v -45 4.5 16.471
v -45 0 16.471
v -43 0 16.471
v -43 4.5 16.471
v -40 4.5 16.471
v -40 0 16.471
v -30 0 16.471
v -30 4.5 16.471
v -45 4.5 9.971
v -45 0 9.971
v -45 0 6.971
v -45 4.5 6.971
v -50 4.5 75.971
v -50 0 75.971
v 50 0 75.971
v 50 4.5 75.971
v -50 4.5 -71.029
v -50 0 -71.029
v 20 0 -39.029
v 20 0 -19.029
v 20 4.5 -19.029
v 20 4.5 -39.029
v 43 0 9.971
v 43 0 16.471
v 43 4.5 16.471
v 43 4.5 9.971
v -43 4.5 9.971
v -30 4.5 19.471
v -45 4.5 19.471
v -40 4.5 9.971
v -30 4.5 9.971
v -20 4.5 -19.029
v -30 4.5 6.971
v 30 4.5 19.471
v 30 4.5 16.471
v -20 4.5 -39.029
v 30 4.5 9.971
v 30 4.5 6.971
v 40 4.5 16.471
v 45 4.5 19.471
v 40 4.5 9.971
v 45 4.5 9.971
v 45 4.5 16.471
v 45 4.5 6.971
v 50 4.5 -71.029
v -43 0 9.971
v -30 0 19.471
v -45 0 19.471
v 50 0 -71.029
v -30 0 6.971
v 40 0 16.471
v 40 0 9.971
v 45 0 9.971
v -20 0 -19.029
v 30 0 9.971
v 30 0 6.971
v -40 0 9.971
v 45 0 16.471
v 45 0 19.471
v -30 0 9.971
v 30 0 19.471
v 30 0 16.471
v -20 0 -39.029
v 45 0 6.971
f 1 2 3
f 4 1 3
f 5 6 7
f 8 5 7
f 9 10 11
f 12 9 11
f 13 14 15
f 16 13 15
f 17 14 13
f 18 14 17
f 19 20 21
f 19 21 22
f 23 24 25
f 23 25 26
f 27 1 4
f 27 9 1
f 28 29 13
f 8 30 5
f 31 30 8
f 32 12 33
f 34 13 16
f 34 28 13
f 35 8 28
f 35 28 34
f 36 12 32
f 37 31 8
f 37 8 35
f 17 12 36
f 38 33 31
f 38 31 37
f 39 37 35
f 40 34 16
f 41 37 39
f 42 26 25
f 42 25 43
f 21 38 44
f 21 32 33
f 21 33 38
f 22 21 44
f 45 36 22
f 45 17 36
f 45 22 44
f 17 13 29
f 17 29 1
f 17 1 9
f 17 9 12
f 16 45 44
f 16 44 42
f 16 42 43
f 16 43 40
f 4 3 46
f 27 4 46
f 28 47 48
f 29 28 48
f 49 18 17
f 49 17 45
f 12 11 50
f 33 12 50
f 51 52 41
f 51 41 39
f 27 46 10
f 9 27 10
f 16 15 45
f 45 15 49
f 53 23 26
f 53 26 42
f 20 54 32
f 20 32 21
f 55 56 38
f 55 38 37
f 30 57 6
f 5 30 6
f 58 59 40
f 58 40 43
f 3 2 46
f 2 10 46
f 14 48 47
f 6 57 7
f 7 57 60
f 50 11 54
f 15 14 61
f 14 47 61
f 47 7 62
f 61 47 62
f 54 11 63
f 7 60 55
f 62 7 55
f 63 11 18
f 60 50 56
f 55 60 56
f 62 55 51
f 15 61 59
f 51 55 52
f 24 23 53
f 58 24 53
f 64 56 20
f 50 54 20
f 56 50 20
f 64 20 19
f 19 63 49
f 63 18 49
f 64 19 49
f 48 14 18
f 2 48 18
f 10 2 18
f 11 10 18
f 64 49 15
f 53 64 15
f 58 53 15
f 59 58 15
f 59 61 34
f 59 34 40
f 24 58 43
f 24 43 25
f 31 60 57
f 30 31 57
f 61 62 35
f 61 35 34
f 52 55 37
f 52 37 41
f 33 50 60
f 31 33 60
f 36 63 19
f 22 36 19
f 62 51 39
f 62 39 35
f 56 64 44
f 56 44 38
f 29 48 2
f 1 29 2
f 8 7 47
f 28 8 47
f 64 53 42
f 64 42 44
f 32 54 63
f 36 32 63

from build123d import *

# Parameters (mm, degrees)
SKETCH2_W           = 100
SKETCH2_H           = 147
SKETCH2_W_2         = 40
SKETCH2_H_2         = 20
BOSS_EXTRUDE1_DEPTH = 4.5


with BuildPart() as part:
    # Sketch2 → Boss-Extrude1 (new body)
    with BuildSketch(Plane(origin=(0, 0, 0), x_dir=(1, 0, 0), z_dir=(0, 1, 0))):
        with Locations((0, -2.47075608)):
            Rectangle(SKETCH2_W, SKETCH2_H)
        with Locations((0, 29.02924392)):
            Rectangle(SKETCH2_W_2, SKETCH2_H_2, mode=Mode.SUBTRACT)
        Polygon((-45, -6.97075608), (-30, -6.97075608), (-30, -9.97075608), (-40, -9.97075608), (-40, -16.47075608), (-30, -16.47075608), (-30, -19.47075608), (-45, -19.47075608), (-45, -16.47075608), (-43, -16.47075608), (-43, -9.97075608), (-45, -9.97075608), align=None, mode=Mode.SUBTRACT)
        Polygon((43, -9.97075608), (45, -9.97075608), (45, -6.97075608), (30, -6.97075608), (30, -9.97075608), (40, -9.97075608), (40, -16.47075608), (30, -16.47075608), (30, -19.47075608), (45, -19.47075608), (45, -16.47075608), (43, -16.47075608), align=None, mode=Mode.SUBTRACT)
    extrude(amount=BOSS_EXTRUDE1_DEPTH)


solid = part.part
